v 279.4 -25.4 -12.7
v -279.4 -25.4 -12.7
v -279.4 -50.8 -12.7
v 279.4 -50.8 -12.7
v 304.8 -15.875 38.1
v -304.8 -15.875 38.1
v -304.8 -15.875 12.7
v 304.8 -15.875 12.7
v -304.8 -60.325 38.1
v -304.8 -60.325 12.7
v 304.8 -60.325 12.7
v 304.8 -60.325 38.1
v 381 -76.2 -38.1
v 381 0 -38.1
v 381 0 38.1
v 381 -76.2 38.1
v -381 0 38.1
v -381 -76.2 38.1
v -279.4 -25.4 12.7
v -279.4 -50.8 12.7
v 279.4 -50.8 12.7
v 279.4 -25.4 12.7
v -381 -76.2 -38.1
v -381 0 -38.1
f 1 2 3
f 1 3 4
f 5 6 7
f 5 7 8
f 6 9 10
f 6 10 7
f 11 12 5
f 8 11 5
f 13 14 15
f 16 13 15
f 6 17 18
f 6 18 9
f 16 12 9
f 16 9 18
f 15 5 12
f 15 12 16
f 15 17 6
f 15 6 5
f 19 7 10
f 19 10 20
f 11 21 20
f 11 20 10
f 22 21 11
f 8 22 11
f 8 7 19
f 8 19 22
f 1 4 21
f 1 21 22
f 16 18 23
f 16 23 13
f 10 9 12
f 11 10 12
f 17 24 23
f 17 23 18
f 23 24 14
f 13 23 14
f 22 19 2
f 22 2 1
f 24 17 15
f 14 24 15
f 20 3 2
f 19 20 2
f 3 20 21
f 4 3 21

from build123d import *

# Parameters (mm, degrees)
F0_W     = 762
F0_H     = 76.2
F1_DEPTH = 76.2
F2_W     = 609.6
F2_H     = 44.45
F3_DEPTH = 25.4
F4_W     = 558.8
F4_H     = 25.4
F5_DEPTH = 25.4


with BuildPart() as f1:
    # F0 (on Front) → F1 (new body)
    with BuildSketch(Plane.XZ):
        Rectangle(F0_W, F0_H)
    extrude(amount=F1_DEPTH)

    # F2 (on face) → F3 (cut)
    with BuildSketch(Plane.XY.offset(38.1)):
        with Locations((0, -38.1)):
            Rectangle(F2_W, F2_H)
    extrude(amount=-F3_DEPTH, mode=Mode.SUBTRACT)

    # F4 (on face) → F5 (cut)
    with BuildSketch(Plane.XY.offset(12.7)):
        with Locations((0, -38.1)):
            Rectangle(F4_W, F4_H)
    extrude(amount=-F5_DEPTH, mode=Mode.SUBTRACT)


solid = f1.part
